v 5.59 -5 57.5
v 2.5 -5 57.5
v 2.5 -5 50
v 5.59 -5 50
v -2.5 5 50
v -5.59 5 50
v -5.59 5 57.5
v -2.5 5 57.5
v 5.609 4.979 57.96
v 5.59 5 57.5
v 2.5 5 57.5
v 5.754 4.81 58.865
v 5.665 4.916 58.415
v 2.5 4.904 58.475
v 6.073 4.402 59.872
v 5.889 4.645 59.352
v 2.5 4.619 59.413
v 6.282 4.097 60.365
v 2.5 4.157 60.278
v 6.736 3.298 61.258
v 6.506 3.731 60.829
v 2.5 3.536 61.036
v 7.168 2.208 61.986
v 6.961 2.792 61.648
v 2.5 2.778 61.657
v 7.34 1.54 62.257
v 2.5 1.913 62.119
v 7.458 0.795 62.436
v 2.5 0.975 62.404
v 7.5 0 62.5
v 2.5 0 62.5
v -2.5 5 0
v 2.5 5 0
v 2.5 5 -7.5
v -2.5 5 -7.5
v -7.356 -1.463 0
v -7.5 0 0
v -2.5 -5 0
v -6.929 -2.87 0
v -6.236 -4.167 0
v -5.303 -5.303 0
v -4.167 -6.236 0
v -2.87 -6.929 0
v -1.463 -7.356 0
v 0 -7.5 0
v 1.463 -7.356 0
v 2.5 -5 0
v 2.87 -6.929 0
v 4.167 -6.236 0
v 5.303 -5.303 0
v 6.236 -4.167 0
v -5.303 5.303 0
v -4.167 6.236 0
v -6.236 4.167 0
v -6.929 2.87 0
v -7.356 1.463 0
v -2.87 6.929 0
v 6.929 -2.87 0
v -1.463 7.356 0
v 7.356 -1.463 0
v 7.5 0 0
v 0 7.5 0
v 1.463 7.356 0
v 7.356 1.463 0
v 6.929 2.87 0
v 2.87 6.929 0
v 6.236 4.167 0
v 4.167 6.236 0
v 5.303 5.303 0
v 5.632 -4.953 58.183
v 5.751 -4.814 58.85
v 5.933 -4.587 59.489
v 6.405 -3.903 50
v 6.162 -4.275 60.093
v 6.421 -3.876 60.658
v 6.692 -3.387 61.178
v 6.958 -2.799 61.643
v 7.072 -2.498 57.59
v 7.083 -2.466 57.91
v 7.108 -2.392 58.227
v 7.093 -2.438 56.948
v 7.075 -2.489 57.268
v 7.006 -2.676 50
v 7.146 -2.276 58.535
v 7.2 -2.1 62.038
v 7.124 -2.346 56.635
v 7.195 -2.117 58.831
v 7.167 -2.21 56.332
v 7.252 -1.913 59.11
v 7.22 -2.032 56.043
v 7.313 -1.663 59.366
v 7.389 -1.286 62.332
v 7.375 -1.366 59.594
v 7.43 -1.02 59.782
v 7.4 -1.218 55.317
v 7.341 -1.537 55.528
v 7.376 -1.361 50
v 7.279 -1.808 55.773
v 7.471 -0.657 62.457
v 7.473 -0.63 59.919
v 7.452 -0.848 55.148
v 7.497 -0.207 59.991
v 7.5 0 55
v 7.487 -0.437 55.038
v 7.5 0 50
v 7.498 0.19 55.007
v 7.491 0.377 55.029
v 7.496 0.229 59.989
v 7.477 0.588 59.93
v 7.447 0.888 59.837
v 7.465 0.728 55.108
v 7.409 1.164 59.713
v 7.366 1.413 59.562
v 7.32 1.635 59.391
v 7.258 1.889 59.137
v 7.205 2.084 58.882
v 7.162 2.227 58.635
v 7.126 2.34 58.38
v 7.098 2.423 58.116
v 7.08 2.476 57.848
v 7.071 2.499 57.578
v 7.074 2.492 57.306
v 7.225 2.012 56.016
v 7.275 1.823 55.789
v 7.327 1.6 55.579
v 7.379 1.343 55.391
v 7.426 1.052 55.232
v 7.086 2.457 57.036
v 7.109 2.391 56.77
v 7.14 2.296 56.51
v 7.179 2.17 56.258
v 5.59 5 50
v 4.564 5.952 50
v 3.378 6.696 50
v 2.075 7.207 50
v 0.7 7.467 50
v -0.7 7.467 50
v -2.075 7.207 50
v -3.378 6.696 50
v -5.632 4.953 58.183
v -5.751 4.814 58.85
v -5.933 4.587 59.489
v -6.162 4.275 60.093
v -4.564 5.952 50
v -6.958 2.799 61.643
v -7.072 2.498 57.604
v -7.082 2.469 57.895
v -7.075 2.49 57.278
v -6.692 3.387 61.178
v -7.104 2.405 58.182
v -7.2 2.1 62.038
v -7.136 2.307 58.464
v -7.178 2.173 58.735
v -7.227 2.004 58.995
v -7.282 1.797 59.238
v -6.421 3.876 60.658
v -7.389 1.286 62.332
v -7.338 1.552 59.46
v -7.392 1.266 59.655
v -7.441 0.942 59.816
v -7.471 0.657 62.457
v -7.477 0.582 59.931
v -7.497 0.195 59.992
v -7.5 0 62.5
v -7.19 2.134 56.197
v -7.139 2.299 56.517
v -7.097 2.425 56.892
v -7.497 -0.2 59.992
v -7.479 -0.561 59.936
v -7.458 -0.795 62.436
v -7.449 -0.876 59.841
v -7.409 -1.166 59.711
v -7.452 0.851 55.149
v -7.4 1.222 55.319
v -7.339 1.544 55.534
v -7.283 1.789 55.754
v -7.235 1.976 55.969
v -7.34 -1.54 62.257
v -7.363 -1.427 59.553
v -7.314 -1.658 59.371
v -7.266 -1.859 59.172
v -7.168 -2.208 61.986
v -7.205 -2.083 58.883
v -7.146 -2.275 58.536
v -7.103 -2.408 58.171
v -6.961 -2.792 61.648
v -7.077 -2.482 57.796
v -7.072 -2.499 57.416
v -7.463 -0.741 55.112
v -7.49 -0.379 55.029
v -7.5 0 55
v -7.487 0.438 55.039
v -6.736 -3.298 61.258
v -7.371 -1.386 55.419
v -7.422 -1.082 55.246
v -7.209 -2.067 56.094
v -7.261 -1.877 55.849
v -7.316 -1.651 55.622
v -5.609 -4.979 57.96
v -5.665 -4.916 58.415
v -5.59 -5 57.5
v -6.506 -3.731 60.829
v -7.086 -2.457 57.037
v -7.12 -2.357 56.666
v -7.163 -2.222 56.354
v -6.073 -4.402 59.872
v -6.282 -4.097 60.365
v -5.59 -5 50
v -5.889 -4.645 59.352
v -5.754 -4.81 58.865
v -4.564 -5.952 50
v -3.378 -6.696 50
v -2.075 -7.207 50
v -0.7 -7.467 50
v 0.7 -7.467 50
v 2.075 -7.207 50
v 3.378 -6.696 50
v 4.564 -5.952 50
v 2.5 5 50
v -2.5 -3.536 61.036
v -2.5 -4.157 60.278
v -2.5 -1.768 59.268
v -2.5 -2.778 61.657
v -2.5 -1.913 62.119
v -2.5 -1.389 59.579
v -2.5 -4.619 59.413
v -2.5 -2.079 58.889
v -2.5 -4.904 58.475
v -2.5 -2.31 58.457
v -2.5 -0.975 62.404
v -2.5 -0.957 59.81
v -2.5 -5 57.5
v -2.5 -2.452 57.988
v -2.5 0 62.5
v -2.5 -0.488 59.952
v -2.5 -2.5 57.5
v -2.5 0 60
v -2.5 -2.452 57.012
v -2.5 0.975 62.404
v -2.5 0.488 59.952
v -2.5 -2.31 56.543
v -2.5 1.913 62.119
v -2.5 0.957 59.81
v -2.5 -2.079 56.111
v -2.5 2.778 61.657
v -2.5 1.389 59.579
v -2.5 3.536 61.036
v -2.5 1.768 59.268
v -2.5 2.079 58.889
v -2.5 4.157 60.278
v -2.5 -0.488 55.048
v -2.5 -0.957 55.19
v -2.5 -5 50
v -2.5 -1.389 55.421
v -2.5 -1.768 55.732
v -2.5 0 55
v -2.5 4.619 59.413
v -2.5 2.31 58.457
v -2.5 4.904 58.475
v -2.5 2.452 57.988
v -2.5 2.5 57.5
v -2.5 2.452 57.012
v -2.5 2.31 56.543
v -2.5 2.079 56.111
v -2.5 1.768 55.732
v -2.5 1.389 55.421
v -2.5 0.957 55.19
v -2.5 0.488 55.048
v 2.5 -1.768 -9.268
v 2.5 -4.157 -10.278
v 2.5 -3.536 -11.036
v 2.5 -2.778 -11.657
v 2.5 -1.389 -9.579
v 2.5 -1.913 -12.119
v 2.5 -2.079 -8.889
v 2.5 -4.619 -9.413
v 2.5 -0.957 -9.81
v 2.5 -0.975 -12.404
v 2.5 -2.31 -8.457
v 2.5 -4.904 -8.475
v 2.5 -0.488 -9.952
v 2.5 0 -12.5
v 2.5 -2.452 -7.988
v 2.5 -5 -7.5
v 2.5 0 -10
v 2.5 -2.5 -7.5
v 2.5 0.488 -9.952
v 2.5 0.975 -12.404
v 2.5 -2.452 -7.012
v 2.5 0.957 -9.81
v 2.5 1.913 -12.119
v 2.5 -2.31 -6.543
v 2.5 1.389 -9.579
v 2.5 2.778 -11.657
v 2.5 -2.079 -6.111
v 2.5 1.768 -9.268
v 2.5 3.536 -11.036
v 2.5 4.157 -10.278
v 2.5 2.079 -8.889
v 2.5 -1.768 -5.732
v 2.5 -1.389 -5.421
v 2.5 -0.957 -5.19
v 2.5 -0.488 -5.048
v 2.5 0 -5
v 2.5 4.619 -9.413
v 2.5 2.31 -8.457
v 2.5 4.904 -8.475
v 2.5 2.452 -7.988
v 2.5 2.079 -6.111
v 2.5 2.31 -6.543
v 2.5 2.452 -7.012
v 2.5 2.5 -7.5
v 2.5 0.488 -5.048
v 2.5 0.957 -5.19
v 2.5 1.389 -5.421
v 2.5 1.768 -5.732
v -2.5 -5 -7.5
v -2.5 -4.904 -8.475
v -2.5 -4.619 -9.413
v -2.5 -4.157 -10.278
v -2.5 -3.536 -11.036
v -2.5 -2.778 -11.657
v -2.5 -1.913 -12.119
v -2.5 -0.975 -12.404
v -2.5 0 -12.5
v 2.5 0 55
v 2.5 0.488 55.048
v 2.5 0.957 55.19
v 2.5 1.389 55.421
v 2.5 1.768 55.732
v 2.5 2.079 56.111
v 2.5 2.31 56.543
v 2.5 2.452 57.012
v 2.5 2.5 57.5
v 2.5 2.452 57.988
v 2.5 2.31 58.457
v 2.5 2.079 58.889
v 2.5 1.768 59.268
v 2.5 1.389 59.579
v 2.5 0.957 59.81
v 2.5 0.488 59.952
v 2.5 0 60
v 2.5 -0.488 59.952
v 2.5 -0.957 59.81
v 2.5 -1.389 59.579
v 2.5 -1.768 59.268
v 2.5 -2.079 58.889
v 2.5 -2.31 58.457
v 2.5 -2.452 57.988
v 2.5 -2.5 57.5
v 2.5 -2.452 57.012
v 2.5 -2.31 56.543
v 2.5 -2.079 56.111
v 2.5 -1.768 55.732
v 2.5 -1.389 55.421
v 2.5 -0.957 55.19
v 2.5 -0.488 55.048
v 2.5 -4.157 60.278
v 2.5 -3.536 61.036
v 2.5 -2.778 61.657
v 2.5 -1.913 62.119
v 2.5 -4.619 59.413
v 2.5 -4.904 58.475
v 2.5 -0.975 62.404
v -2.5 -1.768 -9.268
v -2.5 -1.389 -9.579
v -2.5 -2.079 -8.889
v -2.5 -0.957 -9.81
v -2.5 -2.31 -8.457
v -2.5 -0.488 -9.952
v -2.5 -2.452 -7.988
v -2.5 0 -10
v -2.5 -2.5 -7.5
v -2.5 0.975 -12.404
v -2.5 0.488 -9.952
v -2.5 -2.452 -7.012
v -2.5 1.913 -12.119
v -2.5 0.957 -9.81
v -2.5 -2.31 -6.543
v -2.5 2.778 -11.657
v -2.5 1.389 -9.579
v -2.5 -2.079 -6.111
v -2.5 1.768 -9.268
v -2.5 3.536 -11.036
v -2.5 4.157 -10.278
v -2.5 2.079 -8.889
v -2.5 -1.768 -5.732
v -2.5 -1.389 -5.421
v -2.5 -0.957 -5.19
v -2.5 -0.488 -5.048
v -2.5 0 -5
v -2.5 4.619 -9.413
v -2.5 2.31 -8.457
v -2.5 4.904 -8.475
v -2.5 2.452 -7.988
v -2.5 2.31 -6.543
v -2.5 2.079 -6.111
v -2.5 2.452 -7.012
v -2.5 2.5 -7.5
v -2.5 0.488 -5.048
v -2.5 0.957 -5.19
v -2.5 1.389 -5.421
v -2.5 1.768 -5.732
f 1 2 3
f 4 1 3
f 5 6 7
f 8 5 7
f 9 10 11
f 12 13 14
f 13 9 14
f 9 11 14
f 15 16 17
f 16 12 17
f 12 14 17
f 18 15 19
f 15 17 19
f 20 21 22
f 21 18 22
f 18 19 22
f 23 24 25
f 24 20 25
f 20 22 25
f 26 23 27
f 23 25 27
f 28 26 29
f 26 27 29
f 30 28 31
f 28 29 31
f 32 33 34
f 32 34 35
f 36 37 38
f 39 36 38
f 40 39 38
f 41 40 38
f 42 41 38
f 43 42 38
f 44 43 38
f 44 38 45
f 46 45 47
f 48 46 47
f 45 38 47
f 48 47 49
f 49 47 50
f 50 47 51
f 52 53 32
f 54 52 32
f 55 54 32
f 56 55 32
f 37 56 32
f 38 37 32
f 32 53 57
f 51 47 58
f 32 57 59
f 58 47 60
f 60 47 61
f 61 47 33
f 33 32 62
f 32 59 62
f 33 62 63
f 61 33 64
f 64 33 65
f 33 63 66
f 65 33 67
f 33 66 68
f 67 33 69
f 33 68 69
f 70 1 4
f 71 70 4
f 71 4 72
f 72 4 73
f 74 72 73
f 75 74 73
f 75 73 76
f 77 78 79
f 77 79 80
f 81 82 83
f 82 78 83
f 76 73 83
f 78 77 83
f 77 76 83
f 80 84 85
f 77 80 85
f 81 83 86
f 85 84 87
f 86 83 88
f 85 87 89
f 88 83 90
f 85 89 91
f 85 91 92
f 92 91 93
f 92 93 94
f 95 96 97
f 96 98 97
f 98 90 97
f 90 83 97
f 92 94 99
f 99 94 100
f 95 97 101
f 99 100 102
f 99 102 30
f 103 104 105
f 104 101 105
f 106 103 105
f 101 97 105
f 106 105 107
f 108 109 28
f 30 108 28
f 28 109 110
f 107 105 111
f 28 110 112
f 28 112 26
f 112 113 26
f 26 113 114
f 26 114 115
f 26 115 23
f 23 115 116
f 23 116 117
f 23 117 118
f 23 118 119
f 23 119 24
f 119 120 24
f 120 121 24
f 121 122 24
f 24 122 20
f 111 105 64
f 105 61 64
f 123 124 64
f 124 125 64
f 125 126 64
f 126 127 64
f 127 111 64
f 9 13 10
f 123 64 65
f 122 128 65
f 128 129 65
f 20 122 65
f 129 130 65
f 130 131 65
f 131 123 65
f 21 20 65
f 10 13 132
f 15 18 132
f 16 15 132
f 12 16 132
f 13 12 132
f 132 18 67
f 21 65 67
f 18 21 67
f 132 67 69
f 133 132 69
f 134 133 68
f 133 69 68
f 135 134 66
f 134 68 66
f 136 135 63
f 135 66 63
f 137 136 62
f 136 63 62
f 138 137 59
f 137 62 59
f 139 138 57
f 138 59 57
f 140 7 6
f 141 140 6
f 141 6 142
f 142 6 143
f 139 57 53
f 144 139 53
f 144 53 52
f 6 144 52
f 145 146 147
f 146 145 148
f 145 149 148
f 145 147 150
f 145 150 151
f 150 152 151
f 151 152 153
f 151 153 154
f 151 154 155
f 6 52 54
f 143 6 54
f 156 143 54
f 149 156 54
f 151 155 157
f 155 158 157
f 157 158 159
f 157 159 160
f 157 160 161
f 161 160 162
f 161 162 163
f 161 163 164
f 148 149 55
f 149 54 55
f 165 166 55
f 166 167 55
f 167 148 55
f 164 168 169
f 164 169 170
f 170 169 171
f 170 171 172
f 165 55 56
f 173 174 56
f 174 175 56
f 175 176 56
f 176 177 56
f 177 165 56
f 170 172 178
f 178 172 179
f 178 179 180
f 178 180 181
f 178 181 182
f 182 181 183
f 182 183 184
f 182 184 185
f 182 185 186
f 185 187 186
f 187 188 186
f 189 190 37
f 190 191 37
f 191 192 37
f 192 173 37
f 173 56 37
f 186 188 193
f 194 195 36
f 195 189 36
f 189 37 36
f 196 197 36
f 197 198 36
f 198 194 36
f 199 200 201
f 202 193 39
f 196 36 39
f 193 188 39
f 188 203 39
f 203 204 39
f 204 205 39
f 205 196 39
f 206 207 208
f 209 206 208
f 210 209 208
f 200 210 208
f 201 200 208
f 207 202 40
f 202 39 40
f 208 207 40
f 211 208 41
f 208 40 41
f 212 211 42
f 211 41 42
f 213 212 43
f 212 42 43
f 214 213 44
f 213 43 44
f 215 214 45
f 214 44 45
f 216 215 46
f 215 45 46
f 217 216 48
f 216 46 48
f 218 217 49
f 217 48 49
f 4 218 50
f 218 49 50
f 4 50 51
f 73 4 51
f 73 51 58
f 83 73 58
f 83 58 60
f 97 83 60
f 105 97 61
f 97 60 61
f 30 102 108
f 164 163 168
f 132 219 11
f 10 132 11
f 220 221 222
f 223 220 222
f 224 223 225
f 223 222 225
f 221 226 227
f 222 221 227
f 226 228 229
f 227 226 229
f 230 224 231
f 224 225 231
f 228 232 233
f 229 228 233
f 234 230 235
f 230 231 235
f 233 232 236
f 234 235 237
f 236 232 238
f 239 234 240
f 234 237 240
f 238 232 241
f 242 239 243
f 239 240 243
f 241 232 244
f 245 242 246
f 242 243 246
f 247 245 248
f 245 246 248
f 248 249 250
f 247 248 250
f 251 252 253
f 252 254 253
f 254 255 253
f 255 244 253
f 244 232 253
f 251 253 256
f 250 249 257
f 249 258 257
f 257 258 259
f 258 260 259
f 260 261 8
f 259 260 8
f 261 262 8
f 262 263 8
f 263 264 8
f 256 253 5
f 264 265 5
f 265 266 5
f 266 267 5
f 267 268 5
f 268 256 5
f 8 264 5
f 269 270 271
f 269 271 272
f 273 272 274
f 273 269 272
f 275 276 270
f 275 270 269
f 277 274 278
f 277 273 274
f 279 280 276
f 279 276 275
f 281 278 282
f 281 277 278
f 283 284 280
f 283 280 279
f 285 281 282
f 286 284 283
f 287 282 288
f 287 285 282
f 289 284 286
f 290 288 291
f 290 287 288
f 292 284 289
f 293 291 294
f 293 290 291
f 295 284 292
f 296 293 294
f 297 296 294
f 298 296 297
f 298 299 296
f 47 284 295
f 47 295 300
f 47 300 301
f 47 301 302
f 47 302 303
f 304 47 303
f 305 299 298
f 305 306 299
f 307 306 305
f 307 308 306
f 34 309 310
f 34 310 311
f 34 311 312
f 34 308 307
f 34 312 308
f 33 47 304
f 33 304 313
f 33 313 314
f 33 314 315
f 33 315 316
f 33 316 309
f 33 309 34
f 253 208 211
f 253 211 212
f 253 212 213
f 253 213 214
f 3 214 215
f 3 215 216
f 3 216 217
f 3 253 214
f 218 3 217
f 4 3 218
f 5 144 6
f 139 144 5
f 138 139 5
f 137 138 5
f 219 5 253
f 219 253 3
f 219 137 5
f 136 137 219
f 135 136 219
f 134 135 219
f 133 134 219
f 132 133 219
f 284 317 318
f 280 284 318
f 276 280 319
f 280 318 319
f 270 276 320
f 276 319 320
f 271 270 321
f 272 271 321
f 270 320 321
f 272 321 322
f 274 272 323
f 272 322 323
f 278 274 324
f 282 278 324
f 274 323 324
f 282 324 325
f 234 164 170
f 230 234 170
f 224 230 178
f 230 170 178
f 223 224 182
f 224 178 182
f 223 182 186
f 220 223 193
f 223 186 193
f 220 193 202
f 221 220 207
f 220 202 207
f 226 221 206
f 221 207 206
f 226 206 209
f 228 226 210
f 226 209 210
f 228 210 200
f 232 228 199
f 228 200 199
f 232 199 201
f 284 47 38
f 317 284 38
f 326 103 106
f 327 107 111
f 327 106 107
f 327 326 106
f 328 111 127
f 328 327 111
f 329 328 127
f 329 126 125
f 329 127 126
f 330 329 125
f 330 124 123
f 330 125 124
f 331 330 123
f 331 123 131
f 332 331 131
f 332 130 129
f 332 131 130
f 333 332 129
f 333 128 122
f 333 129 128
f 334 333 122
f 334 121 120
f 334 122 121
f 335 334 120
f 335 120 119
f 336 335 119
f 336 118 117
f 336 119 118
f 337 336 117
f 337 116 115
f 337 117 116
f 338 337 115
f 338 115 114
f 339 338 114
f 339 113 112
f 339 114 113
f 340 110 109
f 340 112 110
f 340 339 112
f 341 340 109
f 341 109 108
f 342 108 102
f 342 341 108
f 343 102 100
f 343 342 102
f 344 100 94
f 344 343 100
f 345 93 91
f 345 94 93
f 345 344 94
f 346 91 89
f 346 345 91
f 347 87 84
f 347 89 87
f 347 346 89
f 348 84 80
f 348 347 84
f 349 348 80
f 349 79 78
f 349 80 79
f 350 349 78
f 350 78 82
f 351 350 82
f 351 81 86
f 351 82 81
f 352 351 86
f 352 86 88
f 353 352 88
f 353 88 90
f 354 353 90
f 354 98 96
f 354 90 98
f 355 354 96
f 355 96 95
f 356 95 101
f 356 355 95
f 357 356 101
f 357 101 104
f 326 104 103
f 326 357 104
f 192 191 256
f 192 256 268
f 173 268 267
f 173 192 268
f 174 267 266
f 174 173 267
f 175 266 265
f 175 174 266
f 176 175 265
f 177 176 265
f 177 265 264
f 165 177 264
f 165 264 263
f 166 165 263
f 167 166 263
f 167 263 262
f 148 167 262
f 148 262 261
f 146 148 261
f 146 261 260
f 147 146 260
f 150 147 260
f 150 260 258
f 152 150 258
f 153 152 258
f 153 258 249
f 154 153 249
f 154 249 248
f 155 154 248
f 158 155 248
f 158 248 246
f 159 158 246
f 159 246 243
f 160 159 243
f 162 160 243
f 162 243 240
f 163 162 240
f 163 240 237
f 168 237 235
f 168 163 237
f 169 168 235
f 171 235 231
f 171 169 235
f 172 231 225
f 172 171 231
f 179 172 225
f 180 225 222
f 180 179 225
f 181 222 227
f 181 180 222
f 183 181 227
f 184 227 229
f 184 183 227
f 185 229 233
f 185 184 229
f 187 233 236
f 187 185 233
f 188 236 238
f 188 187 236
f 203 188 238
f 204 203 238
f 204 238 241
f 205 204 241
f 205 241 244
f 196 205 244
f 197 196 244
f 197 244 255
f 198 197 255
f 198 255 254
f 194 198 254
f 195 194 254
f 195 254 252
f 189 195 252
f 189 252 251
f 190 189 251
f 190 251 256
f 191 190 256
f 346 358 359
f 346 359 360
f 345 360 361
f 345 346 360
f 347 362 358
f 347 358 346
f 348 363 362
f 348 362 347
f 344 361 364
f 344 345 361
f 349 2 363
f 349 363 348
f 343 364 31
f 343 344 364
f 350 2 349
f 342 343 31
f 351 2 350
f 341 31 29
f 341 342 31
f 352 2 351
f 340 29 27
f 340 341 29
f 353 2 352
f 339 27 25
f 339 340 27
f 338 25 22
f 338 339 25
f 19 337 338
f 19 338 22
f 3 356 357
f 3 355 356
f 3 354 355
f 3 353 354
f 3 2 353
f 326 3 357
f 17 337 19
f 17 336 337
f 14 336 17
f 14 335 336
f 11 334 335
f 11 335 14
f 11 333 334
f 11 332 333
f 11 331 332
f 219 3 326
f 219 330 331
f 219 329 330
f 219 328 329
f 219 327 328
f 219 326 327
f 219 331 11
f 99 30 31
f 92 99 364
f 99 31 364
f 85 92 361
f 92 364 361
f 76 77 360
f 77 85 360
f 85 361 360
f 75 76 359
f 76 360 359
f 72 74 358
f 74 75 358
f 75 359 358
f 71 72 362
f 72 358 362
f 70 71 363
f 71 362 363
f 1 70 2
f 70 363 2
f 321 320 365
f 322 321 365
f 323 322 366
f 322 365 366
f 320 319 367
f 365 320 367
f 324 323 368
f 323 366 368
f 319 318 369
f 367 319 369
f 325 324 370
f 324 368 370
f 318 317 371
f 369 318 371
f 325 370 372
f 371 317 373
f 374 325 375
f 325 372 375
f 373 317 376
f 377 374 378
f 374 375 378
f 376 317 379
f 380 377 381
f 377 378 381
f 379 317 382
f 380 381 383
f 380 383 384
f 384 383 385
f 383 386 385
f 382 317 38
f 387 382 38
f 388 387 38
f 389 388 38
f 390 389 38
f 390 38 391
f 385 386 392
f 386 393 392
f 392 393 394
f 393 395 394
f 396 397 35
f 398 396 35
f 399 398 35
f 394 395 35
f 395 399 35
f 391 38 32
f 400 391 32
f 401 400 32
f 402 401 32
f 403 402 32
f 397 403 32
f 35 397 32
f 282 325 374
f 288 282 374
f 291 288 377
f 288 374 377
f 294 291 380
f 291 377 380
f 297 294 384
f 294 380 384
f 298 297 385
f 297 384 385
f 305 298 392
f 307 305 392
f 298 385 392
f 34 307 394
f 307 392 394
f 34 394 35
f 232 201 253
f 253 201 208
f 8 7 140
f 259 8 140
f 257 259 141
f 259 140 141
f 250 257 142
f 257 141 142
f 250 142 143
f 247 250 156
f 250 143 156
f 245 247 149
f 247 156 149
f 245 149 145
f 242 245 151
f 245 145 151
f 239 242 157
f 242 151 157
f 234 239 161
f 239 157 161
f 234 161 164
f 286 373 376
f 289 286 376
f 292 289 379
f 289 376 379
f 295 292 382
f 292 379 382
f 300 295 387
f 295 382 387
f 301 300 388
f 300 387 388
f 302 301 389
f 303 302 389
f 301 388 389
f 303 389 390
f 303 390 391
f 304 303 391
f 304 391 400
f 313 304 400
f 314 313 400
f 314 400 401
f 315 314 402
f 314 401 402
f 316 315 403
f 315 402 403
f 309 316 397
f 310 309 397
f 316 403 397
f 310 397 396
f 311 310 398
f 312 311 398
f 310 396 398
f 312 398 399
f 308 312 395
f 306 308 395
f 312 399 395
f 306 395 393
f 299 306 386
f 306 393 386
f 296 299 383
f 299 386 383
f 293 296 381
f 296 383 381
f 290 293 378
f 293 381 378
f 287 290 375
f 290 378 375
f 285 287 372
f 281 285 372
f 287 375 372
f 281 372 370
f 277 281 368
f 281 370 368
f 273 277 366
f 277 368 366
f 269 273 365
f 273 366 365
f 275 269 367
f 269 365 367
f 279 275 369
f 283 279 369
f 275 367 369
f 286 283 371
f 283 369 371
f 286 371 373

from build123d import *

# Parameters (mm, degrees)
CROQUIS1_R                   = 7.5
SALIENTE_EXTRUIR1_DEPTH      = 50
CROQUIS4_W                   = 5
CROQUIS4_H                   = 10
SALIENTE_EXTRUIR2_DEPTH      = 12.5
CROQUIS5_R                   = 2.5
CORTAR_EXTRUIR1_DEPTH        = 5
SALIENTE_EXTRUIR4_DEPTH      = 7.5
SALIENTE_EXTRUIR4_DEPTH_BACK = 7.5
CROQUIS9_R                   = 2.5
CROQUIS10_W                  = 5
CROQUIS10_H                  = 10
CORTAR_EXTRUIR2_DEPTH        = 12.5
CROQUIS11_R                  = 10
CROQUIS11_R_2                = 7.5
CORTAR_EXTRUIR3_DEPTH        = 12.5


with BuildPart() as part:
    # Croquis1 → Saliente-Extruir1 (new body)
    with BuildSketch(Plane.XY):
        Circle(CROQUIS1_R)
    extrude(amount=SALIENTE_EXTRUIR1_DEPTH)

    # Croquis4 → Saliente-Extruir2 (add)
    with BuildSketch(Plane(origin=(0, 0, 0), x_dir=(-1, 0, 0), z_dir=(0, 0, -1))):
        Rectangle(CROQUIS4_W, CROQUIS4_H)
    extrude(amount=SALIENTE_EXTRUIR2_DEPTH)

    # Croquis5 → Cortar-Extruir1 (cut)
    with BuildSketch(Plane.ZY.offset(2.5)):
        with BuildLine():
            ThreePointArc((-7.5, -5), (-11.035533906, -3.535533906), (-12.5, 0))
            Line((-12.5, 0), (-12.5, -5))
            Line((-12.5, -5), (-7.5, -5))
        make_face()
        with BuildLine():
            ThreePointArc((-12.5, 0), (-11.035533906, 3.535533906), (-7.5, 5))
            Line((-7.5, 5), (-12.5, 5))
            Line((-12.5, 5), (-12.5, 0))
        make_face()
        with Locations(Location((-7.5, 0, 0), (0, 0, 270))):
            Circle(CROQUIS5_R)
    extrude(amount=-CORTAR_EXTRUIR1_DEPTH, mode=Mode.SUBTRACT)

    # Croquis9 → Saliente-Extruir4 (add, two sides: drawn at the far end of the back side and taken through both)
    with BuildSketch(Plane(origin=(0, 0, 0), x_dir=(0, 0, -1), z_dir=(1, 0, 0)).offset(-SALIENTE_EXTRUIR4_DEPTH_BACK)):
        with BuildLine():
            Line((-50, -5), (-50, 5))
            Line((-50, 5), (-57.5, 5))
            ThreePointArc((-57.5, 5), (-61.035533906, 3.535533906), (-62.5, 0))
            ThreePointArc((-62.5, 0), (-61.035533906, -3.535533906), (-57.5, -5))
            Line((-57.5, -5), (-50, -5))
        make_face()
        with Locations((-57.5, 0)):
            Circle(CROQUIS9_R, mode=Mode.SUBTRACT)
    extrude(amount=SALIENTE_EXTRUIR4_DEPTH + SALIENTE_EXTRUIR4_DEPTH_BACK)

    # Croquis10 → Cortar-Extruir2 (cut)
    with BuildSketch(Plane.XY.offset(50)):
        Rectangle(CROQUIS10_W, CROQUIS10_H)
    extrude(amount=CORTAR_EXTRUIR2_DEPTH, mode=Mode.SUBTRACT)

    # Croquis11 → Cortar-Extruir3 (cut)
    with BuildSketch(Plane.XY.offset(50)):
        Circle(CROQUIS11_R)
        with Locations(Location((0, 0, 0), (0, 0, 221.810314896))):
            Circle(CROQUIS11_R_2, mode=Mode.SUBTRACT)
    extrude(amount=CORTAR_EXTRUIR3_DEPTH, mode=Mode.SUBTRACT)


solid = part.part
